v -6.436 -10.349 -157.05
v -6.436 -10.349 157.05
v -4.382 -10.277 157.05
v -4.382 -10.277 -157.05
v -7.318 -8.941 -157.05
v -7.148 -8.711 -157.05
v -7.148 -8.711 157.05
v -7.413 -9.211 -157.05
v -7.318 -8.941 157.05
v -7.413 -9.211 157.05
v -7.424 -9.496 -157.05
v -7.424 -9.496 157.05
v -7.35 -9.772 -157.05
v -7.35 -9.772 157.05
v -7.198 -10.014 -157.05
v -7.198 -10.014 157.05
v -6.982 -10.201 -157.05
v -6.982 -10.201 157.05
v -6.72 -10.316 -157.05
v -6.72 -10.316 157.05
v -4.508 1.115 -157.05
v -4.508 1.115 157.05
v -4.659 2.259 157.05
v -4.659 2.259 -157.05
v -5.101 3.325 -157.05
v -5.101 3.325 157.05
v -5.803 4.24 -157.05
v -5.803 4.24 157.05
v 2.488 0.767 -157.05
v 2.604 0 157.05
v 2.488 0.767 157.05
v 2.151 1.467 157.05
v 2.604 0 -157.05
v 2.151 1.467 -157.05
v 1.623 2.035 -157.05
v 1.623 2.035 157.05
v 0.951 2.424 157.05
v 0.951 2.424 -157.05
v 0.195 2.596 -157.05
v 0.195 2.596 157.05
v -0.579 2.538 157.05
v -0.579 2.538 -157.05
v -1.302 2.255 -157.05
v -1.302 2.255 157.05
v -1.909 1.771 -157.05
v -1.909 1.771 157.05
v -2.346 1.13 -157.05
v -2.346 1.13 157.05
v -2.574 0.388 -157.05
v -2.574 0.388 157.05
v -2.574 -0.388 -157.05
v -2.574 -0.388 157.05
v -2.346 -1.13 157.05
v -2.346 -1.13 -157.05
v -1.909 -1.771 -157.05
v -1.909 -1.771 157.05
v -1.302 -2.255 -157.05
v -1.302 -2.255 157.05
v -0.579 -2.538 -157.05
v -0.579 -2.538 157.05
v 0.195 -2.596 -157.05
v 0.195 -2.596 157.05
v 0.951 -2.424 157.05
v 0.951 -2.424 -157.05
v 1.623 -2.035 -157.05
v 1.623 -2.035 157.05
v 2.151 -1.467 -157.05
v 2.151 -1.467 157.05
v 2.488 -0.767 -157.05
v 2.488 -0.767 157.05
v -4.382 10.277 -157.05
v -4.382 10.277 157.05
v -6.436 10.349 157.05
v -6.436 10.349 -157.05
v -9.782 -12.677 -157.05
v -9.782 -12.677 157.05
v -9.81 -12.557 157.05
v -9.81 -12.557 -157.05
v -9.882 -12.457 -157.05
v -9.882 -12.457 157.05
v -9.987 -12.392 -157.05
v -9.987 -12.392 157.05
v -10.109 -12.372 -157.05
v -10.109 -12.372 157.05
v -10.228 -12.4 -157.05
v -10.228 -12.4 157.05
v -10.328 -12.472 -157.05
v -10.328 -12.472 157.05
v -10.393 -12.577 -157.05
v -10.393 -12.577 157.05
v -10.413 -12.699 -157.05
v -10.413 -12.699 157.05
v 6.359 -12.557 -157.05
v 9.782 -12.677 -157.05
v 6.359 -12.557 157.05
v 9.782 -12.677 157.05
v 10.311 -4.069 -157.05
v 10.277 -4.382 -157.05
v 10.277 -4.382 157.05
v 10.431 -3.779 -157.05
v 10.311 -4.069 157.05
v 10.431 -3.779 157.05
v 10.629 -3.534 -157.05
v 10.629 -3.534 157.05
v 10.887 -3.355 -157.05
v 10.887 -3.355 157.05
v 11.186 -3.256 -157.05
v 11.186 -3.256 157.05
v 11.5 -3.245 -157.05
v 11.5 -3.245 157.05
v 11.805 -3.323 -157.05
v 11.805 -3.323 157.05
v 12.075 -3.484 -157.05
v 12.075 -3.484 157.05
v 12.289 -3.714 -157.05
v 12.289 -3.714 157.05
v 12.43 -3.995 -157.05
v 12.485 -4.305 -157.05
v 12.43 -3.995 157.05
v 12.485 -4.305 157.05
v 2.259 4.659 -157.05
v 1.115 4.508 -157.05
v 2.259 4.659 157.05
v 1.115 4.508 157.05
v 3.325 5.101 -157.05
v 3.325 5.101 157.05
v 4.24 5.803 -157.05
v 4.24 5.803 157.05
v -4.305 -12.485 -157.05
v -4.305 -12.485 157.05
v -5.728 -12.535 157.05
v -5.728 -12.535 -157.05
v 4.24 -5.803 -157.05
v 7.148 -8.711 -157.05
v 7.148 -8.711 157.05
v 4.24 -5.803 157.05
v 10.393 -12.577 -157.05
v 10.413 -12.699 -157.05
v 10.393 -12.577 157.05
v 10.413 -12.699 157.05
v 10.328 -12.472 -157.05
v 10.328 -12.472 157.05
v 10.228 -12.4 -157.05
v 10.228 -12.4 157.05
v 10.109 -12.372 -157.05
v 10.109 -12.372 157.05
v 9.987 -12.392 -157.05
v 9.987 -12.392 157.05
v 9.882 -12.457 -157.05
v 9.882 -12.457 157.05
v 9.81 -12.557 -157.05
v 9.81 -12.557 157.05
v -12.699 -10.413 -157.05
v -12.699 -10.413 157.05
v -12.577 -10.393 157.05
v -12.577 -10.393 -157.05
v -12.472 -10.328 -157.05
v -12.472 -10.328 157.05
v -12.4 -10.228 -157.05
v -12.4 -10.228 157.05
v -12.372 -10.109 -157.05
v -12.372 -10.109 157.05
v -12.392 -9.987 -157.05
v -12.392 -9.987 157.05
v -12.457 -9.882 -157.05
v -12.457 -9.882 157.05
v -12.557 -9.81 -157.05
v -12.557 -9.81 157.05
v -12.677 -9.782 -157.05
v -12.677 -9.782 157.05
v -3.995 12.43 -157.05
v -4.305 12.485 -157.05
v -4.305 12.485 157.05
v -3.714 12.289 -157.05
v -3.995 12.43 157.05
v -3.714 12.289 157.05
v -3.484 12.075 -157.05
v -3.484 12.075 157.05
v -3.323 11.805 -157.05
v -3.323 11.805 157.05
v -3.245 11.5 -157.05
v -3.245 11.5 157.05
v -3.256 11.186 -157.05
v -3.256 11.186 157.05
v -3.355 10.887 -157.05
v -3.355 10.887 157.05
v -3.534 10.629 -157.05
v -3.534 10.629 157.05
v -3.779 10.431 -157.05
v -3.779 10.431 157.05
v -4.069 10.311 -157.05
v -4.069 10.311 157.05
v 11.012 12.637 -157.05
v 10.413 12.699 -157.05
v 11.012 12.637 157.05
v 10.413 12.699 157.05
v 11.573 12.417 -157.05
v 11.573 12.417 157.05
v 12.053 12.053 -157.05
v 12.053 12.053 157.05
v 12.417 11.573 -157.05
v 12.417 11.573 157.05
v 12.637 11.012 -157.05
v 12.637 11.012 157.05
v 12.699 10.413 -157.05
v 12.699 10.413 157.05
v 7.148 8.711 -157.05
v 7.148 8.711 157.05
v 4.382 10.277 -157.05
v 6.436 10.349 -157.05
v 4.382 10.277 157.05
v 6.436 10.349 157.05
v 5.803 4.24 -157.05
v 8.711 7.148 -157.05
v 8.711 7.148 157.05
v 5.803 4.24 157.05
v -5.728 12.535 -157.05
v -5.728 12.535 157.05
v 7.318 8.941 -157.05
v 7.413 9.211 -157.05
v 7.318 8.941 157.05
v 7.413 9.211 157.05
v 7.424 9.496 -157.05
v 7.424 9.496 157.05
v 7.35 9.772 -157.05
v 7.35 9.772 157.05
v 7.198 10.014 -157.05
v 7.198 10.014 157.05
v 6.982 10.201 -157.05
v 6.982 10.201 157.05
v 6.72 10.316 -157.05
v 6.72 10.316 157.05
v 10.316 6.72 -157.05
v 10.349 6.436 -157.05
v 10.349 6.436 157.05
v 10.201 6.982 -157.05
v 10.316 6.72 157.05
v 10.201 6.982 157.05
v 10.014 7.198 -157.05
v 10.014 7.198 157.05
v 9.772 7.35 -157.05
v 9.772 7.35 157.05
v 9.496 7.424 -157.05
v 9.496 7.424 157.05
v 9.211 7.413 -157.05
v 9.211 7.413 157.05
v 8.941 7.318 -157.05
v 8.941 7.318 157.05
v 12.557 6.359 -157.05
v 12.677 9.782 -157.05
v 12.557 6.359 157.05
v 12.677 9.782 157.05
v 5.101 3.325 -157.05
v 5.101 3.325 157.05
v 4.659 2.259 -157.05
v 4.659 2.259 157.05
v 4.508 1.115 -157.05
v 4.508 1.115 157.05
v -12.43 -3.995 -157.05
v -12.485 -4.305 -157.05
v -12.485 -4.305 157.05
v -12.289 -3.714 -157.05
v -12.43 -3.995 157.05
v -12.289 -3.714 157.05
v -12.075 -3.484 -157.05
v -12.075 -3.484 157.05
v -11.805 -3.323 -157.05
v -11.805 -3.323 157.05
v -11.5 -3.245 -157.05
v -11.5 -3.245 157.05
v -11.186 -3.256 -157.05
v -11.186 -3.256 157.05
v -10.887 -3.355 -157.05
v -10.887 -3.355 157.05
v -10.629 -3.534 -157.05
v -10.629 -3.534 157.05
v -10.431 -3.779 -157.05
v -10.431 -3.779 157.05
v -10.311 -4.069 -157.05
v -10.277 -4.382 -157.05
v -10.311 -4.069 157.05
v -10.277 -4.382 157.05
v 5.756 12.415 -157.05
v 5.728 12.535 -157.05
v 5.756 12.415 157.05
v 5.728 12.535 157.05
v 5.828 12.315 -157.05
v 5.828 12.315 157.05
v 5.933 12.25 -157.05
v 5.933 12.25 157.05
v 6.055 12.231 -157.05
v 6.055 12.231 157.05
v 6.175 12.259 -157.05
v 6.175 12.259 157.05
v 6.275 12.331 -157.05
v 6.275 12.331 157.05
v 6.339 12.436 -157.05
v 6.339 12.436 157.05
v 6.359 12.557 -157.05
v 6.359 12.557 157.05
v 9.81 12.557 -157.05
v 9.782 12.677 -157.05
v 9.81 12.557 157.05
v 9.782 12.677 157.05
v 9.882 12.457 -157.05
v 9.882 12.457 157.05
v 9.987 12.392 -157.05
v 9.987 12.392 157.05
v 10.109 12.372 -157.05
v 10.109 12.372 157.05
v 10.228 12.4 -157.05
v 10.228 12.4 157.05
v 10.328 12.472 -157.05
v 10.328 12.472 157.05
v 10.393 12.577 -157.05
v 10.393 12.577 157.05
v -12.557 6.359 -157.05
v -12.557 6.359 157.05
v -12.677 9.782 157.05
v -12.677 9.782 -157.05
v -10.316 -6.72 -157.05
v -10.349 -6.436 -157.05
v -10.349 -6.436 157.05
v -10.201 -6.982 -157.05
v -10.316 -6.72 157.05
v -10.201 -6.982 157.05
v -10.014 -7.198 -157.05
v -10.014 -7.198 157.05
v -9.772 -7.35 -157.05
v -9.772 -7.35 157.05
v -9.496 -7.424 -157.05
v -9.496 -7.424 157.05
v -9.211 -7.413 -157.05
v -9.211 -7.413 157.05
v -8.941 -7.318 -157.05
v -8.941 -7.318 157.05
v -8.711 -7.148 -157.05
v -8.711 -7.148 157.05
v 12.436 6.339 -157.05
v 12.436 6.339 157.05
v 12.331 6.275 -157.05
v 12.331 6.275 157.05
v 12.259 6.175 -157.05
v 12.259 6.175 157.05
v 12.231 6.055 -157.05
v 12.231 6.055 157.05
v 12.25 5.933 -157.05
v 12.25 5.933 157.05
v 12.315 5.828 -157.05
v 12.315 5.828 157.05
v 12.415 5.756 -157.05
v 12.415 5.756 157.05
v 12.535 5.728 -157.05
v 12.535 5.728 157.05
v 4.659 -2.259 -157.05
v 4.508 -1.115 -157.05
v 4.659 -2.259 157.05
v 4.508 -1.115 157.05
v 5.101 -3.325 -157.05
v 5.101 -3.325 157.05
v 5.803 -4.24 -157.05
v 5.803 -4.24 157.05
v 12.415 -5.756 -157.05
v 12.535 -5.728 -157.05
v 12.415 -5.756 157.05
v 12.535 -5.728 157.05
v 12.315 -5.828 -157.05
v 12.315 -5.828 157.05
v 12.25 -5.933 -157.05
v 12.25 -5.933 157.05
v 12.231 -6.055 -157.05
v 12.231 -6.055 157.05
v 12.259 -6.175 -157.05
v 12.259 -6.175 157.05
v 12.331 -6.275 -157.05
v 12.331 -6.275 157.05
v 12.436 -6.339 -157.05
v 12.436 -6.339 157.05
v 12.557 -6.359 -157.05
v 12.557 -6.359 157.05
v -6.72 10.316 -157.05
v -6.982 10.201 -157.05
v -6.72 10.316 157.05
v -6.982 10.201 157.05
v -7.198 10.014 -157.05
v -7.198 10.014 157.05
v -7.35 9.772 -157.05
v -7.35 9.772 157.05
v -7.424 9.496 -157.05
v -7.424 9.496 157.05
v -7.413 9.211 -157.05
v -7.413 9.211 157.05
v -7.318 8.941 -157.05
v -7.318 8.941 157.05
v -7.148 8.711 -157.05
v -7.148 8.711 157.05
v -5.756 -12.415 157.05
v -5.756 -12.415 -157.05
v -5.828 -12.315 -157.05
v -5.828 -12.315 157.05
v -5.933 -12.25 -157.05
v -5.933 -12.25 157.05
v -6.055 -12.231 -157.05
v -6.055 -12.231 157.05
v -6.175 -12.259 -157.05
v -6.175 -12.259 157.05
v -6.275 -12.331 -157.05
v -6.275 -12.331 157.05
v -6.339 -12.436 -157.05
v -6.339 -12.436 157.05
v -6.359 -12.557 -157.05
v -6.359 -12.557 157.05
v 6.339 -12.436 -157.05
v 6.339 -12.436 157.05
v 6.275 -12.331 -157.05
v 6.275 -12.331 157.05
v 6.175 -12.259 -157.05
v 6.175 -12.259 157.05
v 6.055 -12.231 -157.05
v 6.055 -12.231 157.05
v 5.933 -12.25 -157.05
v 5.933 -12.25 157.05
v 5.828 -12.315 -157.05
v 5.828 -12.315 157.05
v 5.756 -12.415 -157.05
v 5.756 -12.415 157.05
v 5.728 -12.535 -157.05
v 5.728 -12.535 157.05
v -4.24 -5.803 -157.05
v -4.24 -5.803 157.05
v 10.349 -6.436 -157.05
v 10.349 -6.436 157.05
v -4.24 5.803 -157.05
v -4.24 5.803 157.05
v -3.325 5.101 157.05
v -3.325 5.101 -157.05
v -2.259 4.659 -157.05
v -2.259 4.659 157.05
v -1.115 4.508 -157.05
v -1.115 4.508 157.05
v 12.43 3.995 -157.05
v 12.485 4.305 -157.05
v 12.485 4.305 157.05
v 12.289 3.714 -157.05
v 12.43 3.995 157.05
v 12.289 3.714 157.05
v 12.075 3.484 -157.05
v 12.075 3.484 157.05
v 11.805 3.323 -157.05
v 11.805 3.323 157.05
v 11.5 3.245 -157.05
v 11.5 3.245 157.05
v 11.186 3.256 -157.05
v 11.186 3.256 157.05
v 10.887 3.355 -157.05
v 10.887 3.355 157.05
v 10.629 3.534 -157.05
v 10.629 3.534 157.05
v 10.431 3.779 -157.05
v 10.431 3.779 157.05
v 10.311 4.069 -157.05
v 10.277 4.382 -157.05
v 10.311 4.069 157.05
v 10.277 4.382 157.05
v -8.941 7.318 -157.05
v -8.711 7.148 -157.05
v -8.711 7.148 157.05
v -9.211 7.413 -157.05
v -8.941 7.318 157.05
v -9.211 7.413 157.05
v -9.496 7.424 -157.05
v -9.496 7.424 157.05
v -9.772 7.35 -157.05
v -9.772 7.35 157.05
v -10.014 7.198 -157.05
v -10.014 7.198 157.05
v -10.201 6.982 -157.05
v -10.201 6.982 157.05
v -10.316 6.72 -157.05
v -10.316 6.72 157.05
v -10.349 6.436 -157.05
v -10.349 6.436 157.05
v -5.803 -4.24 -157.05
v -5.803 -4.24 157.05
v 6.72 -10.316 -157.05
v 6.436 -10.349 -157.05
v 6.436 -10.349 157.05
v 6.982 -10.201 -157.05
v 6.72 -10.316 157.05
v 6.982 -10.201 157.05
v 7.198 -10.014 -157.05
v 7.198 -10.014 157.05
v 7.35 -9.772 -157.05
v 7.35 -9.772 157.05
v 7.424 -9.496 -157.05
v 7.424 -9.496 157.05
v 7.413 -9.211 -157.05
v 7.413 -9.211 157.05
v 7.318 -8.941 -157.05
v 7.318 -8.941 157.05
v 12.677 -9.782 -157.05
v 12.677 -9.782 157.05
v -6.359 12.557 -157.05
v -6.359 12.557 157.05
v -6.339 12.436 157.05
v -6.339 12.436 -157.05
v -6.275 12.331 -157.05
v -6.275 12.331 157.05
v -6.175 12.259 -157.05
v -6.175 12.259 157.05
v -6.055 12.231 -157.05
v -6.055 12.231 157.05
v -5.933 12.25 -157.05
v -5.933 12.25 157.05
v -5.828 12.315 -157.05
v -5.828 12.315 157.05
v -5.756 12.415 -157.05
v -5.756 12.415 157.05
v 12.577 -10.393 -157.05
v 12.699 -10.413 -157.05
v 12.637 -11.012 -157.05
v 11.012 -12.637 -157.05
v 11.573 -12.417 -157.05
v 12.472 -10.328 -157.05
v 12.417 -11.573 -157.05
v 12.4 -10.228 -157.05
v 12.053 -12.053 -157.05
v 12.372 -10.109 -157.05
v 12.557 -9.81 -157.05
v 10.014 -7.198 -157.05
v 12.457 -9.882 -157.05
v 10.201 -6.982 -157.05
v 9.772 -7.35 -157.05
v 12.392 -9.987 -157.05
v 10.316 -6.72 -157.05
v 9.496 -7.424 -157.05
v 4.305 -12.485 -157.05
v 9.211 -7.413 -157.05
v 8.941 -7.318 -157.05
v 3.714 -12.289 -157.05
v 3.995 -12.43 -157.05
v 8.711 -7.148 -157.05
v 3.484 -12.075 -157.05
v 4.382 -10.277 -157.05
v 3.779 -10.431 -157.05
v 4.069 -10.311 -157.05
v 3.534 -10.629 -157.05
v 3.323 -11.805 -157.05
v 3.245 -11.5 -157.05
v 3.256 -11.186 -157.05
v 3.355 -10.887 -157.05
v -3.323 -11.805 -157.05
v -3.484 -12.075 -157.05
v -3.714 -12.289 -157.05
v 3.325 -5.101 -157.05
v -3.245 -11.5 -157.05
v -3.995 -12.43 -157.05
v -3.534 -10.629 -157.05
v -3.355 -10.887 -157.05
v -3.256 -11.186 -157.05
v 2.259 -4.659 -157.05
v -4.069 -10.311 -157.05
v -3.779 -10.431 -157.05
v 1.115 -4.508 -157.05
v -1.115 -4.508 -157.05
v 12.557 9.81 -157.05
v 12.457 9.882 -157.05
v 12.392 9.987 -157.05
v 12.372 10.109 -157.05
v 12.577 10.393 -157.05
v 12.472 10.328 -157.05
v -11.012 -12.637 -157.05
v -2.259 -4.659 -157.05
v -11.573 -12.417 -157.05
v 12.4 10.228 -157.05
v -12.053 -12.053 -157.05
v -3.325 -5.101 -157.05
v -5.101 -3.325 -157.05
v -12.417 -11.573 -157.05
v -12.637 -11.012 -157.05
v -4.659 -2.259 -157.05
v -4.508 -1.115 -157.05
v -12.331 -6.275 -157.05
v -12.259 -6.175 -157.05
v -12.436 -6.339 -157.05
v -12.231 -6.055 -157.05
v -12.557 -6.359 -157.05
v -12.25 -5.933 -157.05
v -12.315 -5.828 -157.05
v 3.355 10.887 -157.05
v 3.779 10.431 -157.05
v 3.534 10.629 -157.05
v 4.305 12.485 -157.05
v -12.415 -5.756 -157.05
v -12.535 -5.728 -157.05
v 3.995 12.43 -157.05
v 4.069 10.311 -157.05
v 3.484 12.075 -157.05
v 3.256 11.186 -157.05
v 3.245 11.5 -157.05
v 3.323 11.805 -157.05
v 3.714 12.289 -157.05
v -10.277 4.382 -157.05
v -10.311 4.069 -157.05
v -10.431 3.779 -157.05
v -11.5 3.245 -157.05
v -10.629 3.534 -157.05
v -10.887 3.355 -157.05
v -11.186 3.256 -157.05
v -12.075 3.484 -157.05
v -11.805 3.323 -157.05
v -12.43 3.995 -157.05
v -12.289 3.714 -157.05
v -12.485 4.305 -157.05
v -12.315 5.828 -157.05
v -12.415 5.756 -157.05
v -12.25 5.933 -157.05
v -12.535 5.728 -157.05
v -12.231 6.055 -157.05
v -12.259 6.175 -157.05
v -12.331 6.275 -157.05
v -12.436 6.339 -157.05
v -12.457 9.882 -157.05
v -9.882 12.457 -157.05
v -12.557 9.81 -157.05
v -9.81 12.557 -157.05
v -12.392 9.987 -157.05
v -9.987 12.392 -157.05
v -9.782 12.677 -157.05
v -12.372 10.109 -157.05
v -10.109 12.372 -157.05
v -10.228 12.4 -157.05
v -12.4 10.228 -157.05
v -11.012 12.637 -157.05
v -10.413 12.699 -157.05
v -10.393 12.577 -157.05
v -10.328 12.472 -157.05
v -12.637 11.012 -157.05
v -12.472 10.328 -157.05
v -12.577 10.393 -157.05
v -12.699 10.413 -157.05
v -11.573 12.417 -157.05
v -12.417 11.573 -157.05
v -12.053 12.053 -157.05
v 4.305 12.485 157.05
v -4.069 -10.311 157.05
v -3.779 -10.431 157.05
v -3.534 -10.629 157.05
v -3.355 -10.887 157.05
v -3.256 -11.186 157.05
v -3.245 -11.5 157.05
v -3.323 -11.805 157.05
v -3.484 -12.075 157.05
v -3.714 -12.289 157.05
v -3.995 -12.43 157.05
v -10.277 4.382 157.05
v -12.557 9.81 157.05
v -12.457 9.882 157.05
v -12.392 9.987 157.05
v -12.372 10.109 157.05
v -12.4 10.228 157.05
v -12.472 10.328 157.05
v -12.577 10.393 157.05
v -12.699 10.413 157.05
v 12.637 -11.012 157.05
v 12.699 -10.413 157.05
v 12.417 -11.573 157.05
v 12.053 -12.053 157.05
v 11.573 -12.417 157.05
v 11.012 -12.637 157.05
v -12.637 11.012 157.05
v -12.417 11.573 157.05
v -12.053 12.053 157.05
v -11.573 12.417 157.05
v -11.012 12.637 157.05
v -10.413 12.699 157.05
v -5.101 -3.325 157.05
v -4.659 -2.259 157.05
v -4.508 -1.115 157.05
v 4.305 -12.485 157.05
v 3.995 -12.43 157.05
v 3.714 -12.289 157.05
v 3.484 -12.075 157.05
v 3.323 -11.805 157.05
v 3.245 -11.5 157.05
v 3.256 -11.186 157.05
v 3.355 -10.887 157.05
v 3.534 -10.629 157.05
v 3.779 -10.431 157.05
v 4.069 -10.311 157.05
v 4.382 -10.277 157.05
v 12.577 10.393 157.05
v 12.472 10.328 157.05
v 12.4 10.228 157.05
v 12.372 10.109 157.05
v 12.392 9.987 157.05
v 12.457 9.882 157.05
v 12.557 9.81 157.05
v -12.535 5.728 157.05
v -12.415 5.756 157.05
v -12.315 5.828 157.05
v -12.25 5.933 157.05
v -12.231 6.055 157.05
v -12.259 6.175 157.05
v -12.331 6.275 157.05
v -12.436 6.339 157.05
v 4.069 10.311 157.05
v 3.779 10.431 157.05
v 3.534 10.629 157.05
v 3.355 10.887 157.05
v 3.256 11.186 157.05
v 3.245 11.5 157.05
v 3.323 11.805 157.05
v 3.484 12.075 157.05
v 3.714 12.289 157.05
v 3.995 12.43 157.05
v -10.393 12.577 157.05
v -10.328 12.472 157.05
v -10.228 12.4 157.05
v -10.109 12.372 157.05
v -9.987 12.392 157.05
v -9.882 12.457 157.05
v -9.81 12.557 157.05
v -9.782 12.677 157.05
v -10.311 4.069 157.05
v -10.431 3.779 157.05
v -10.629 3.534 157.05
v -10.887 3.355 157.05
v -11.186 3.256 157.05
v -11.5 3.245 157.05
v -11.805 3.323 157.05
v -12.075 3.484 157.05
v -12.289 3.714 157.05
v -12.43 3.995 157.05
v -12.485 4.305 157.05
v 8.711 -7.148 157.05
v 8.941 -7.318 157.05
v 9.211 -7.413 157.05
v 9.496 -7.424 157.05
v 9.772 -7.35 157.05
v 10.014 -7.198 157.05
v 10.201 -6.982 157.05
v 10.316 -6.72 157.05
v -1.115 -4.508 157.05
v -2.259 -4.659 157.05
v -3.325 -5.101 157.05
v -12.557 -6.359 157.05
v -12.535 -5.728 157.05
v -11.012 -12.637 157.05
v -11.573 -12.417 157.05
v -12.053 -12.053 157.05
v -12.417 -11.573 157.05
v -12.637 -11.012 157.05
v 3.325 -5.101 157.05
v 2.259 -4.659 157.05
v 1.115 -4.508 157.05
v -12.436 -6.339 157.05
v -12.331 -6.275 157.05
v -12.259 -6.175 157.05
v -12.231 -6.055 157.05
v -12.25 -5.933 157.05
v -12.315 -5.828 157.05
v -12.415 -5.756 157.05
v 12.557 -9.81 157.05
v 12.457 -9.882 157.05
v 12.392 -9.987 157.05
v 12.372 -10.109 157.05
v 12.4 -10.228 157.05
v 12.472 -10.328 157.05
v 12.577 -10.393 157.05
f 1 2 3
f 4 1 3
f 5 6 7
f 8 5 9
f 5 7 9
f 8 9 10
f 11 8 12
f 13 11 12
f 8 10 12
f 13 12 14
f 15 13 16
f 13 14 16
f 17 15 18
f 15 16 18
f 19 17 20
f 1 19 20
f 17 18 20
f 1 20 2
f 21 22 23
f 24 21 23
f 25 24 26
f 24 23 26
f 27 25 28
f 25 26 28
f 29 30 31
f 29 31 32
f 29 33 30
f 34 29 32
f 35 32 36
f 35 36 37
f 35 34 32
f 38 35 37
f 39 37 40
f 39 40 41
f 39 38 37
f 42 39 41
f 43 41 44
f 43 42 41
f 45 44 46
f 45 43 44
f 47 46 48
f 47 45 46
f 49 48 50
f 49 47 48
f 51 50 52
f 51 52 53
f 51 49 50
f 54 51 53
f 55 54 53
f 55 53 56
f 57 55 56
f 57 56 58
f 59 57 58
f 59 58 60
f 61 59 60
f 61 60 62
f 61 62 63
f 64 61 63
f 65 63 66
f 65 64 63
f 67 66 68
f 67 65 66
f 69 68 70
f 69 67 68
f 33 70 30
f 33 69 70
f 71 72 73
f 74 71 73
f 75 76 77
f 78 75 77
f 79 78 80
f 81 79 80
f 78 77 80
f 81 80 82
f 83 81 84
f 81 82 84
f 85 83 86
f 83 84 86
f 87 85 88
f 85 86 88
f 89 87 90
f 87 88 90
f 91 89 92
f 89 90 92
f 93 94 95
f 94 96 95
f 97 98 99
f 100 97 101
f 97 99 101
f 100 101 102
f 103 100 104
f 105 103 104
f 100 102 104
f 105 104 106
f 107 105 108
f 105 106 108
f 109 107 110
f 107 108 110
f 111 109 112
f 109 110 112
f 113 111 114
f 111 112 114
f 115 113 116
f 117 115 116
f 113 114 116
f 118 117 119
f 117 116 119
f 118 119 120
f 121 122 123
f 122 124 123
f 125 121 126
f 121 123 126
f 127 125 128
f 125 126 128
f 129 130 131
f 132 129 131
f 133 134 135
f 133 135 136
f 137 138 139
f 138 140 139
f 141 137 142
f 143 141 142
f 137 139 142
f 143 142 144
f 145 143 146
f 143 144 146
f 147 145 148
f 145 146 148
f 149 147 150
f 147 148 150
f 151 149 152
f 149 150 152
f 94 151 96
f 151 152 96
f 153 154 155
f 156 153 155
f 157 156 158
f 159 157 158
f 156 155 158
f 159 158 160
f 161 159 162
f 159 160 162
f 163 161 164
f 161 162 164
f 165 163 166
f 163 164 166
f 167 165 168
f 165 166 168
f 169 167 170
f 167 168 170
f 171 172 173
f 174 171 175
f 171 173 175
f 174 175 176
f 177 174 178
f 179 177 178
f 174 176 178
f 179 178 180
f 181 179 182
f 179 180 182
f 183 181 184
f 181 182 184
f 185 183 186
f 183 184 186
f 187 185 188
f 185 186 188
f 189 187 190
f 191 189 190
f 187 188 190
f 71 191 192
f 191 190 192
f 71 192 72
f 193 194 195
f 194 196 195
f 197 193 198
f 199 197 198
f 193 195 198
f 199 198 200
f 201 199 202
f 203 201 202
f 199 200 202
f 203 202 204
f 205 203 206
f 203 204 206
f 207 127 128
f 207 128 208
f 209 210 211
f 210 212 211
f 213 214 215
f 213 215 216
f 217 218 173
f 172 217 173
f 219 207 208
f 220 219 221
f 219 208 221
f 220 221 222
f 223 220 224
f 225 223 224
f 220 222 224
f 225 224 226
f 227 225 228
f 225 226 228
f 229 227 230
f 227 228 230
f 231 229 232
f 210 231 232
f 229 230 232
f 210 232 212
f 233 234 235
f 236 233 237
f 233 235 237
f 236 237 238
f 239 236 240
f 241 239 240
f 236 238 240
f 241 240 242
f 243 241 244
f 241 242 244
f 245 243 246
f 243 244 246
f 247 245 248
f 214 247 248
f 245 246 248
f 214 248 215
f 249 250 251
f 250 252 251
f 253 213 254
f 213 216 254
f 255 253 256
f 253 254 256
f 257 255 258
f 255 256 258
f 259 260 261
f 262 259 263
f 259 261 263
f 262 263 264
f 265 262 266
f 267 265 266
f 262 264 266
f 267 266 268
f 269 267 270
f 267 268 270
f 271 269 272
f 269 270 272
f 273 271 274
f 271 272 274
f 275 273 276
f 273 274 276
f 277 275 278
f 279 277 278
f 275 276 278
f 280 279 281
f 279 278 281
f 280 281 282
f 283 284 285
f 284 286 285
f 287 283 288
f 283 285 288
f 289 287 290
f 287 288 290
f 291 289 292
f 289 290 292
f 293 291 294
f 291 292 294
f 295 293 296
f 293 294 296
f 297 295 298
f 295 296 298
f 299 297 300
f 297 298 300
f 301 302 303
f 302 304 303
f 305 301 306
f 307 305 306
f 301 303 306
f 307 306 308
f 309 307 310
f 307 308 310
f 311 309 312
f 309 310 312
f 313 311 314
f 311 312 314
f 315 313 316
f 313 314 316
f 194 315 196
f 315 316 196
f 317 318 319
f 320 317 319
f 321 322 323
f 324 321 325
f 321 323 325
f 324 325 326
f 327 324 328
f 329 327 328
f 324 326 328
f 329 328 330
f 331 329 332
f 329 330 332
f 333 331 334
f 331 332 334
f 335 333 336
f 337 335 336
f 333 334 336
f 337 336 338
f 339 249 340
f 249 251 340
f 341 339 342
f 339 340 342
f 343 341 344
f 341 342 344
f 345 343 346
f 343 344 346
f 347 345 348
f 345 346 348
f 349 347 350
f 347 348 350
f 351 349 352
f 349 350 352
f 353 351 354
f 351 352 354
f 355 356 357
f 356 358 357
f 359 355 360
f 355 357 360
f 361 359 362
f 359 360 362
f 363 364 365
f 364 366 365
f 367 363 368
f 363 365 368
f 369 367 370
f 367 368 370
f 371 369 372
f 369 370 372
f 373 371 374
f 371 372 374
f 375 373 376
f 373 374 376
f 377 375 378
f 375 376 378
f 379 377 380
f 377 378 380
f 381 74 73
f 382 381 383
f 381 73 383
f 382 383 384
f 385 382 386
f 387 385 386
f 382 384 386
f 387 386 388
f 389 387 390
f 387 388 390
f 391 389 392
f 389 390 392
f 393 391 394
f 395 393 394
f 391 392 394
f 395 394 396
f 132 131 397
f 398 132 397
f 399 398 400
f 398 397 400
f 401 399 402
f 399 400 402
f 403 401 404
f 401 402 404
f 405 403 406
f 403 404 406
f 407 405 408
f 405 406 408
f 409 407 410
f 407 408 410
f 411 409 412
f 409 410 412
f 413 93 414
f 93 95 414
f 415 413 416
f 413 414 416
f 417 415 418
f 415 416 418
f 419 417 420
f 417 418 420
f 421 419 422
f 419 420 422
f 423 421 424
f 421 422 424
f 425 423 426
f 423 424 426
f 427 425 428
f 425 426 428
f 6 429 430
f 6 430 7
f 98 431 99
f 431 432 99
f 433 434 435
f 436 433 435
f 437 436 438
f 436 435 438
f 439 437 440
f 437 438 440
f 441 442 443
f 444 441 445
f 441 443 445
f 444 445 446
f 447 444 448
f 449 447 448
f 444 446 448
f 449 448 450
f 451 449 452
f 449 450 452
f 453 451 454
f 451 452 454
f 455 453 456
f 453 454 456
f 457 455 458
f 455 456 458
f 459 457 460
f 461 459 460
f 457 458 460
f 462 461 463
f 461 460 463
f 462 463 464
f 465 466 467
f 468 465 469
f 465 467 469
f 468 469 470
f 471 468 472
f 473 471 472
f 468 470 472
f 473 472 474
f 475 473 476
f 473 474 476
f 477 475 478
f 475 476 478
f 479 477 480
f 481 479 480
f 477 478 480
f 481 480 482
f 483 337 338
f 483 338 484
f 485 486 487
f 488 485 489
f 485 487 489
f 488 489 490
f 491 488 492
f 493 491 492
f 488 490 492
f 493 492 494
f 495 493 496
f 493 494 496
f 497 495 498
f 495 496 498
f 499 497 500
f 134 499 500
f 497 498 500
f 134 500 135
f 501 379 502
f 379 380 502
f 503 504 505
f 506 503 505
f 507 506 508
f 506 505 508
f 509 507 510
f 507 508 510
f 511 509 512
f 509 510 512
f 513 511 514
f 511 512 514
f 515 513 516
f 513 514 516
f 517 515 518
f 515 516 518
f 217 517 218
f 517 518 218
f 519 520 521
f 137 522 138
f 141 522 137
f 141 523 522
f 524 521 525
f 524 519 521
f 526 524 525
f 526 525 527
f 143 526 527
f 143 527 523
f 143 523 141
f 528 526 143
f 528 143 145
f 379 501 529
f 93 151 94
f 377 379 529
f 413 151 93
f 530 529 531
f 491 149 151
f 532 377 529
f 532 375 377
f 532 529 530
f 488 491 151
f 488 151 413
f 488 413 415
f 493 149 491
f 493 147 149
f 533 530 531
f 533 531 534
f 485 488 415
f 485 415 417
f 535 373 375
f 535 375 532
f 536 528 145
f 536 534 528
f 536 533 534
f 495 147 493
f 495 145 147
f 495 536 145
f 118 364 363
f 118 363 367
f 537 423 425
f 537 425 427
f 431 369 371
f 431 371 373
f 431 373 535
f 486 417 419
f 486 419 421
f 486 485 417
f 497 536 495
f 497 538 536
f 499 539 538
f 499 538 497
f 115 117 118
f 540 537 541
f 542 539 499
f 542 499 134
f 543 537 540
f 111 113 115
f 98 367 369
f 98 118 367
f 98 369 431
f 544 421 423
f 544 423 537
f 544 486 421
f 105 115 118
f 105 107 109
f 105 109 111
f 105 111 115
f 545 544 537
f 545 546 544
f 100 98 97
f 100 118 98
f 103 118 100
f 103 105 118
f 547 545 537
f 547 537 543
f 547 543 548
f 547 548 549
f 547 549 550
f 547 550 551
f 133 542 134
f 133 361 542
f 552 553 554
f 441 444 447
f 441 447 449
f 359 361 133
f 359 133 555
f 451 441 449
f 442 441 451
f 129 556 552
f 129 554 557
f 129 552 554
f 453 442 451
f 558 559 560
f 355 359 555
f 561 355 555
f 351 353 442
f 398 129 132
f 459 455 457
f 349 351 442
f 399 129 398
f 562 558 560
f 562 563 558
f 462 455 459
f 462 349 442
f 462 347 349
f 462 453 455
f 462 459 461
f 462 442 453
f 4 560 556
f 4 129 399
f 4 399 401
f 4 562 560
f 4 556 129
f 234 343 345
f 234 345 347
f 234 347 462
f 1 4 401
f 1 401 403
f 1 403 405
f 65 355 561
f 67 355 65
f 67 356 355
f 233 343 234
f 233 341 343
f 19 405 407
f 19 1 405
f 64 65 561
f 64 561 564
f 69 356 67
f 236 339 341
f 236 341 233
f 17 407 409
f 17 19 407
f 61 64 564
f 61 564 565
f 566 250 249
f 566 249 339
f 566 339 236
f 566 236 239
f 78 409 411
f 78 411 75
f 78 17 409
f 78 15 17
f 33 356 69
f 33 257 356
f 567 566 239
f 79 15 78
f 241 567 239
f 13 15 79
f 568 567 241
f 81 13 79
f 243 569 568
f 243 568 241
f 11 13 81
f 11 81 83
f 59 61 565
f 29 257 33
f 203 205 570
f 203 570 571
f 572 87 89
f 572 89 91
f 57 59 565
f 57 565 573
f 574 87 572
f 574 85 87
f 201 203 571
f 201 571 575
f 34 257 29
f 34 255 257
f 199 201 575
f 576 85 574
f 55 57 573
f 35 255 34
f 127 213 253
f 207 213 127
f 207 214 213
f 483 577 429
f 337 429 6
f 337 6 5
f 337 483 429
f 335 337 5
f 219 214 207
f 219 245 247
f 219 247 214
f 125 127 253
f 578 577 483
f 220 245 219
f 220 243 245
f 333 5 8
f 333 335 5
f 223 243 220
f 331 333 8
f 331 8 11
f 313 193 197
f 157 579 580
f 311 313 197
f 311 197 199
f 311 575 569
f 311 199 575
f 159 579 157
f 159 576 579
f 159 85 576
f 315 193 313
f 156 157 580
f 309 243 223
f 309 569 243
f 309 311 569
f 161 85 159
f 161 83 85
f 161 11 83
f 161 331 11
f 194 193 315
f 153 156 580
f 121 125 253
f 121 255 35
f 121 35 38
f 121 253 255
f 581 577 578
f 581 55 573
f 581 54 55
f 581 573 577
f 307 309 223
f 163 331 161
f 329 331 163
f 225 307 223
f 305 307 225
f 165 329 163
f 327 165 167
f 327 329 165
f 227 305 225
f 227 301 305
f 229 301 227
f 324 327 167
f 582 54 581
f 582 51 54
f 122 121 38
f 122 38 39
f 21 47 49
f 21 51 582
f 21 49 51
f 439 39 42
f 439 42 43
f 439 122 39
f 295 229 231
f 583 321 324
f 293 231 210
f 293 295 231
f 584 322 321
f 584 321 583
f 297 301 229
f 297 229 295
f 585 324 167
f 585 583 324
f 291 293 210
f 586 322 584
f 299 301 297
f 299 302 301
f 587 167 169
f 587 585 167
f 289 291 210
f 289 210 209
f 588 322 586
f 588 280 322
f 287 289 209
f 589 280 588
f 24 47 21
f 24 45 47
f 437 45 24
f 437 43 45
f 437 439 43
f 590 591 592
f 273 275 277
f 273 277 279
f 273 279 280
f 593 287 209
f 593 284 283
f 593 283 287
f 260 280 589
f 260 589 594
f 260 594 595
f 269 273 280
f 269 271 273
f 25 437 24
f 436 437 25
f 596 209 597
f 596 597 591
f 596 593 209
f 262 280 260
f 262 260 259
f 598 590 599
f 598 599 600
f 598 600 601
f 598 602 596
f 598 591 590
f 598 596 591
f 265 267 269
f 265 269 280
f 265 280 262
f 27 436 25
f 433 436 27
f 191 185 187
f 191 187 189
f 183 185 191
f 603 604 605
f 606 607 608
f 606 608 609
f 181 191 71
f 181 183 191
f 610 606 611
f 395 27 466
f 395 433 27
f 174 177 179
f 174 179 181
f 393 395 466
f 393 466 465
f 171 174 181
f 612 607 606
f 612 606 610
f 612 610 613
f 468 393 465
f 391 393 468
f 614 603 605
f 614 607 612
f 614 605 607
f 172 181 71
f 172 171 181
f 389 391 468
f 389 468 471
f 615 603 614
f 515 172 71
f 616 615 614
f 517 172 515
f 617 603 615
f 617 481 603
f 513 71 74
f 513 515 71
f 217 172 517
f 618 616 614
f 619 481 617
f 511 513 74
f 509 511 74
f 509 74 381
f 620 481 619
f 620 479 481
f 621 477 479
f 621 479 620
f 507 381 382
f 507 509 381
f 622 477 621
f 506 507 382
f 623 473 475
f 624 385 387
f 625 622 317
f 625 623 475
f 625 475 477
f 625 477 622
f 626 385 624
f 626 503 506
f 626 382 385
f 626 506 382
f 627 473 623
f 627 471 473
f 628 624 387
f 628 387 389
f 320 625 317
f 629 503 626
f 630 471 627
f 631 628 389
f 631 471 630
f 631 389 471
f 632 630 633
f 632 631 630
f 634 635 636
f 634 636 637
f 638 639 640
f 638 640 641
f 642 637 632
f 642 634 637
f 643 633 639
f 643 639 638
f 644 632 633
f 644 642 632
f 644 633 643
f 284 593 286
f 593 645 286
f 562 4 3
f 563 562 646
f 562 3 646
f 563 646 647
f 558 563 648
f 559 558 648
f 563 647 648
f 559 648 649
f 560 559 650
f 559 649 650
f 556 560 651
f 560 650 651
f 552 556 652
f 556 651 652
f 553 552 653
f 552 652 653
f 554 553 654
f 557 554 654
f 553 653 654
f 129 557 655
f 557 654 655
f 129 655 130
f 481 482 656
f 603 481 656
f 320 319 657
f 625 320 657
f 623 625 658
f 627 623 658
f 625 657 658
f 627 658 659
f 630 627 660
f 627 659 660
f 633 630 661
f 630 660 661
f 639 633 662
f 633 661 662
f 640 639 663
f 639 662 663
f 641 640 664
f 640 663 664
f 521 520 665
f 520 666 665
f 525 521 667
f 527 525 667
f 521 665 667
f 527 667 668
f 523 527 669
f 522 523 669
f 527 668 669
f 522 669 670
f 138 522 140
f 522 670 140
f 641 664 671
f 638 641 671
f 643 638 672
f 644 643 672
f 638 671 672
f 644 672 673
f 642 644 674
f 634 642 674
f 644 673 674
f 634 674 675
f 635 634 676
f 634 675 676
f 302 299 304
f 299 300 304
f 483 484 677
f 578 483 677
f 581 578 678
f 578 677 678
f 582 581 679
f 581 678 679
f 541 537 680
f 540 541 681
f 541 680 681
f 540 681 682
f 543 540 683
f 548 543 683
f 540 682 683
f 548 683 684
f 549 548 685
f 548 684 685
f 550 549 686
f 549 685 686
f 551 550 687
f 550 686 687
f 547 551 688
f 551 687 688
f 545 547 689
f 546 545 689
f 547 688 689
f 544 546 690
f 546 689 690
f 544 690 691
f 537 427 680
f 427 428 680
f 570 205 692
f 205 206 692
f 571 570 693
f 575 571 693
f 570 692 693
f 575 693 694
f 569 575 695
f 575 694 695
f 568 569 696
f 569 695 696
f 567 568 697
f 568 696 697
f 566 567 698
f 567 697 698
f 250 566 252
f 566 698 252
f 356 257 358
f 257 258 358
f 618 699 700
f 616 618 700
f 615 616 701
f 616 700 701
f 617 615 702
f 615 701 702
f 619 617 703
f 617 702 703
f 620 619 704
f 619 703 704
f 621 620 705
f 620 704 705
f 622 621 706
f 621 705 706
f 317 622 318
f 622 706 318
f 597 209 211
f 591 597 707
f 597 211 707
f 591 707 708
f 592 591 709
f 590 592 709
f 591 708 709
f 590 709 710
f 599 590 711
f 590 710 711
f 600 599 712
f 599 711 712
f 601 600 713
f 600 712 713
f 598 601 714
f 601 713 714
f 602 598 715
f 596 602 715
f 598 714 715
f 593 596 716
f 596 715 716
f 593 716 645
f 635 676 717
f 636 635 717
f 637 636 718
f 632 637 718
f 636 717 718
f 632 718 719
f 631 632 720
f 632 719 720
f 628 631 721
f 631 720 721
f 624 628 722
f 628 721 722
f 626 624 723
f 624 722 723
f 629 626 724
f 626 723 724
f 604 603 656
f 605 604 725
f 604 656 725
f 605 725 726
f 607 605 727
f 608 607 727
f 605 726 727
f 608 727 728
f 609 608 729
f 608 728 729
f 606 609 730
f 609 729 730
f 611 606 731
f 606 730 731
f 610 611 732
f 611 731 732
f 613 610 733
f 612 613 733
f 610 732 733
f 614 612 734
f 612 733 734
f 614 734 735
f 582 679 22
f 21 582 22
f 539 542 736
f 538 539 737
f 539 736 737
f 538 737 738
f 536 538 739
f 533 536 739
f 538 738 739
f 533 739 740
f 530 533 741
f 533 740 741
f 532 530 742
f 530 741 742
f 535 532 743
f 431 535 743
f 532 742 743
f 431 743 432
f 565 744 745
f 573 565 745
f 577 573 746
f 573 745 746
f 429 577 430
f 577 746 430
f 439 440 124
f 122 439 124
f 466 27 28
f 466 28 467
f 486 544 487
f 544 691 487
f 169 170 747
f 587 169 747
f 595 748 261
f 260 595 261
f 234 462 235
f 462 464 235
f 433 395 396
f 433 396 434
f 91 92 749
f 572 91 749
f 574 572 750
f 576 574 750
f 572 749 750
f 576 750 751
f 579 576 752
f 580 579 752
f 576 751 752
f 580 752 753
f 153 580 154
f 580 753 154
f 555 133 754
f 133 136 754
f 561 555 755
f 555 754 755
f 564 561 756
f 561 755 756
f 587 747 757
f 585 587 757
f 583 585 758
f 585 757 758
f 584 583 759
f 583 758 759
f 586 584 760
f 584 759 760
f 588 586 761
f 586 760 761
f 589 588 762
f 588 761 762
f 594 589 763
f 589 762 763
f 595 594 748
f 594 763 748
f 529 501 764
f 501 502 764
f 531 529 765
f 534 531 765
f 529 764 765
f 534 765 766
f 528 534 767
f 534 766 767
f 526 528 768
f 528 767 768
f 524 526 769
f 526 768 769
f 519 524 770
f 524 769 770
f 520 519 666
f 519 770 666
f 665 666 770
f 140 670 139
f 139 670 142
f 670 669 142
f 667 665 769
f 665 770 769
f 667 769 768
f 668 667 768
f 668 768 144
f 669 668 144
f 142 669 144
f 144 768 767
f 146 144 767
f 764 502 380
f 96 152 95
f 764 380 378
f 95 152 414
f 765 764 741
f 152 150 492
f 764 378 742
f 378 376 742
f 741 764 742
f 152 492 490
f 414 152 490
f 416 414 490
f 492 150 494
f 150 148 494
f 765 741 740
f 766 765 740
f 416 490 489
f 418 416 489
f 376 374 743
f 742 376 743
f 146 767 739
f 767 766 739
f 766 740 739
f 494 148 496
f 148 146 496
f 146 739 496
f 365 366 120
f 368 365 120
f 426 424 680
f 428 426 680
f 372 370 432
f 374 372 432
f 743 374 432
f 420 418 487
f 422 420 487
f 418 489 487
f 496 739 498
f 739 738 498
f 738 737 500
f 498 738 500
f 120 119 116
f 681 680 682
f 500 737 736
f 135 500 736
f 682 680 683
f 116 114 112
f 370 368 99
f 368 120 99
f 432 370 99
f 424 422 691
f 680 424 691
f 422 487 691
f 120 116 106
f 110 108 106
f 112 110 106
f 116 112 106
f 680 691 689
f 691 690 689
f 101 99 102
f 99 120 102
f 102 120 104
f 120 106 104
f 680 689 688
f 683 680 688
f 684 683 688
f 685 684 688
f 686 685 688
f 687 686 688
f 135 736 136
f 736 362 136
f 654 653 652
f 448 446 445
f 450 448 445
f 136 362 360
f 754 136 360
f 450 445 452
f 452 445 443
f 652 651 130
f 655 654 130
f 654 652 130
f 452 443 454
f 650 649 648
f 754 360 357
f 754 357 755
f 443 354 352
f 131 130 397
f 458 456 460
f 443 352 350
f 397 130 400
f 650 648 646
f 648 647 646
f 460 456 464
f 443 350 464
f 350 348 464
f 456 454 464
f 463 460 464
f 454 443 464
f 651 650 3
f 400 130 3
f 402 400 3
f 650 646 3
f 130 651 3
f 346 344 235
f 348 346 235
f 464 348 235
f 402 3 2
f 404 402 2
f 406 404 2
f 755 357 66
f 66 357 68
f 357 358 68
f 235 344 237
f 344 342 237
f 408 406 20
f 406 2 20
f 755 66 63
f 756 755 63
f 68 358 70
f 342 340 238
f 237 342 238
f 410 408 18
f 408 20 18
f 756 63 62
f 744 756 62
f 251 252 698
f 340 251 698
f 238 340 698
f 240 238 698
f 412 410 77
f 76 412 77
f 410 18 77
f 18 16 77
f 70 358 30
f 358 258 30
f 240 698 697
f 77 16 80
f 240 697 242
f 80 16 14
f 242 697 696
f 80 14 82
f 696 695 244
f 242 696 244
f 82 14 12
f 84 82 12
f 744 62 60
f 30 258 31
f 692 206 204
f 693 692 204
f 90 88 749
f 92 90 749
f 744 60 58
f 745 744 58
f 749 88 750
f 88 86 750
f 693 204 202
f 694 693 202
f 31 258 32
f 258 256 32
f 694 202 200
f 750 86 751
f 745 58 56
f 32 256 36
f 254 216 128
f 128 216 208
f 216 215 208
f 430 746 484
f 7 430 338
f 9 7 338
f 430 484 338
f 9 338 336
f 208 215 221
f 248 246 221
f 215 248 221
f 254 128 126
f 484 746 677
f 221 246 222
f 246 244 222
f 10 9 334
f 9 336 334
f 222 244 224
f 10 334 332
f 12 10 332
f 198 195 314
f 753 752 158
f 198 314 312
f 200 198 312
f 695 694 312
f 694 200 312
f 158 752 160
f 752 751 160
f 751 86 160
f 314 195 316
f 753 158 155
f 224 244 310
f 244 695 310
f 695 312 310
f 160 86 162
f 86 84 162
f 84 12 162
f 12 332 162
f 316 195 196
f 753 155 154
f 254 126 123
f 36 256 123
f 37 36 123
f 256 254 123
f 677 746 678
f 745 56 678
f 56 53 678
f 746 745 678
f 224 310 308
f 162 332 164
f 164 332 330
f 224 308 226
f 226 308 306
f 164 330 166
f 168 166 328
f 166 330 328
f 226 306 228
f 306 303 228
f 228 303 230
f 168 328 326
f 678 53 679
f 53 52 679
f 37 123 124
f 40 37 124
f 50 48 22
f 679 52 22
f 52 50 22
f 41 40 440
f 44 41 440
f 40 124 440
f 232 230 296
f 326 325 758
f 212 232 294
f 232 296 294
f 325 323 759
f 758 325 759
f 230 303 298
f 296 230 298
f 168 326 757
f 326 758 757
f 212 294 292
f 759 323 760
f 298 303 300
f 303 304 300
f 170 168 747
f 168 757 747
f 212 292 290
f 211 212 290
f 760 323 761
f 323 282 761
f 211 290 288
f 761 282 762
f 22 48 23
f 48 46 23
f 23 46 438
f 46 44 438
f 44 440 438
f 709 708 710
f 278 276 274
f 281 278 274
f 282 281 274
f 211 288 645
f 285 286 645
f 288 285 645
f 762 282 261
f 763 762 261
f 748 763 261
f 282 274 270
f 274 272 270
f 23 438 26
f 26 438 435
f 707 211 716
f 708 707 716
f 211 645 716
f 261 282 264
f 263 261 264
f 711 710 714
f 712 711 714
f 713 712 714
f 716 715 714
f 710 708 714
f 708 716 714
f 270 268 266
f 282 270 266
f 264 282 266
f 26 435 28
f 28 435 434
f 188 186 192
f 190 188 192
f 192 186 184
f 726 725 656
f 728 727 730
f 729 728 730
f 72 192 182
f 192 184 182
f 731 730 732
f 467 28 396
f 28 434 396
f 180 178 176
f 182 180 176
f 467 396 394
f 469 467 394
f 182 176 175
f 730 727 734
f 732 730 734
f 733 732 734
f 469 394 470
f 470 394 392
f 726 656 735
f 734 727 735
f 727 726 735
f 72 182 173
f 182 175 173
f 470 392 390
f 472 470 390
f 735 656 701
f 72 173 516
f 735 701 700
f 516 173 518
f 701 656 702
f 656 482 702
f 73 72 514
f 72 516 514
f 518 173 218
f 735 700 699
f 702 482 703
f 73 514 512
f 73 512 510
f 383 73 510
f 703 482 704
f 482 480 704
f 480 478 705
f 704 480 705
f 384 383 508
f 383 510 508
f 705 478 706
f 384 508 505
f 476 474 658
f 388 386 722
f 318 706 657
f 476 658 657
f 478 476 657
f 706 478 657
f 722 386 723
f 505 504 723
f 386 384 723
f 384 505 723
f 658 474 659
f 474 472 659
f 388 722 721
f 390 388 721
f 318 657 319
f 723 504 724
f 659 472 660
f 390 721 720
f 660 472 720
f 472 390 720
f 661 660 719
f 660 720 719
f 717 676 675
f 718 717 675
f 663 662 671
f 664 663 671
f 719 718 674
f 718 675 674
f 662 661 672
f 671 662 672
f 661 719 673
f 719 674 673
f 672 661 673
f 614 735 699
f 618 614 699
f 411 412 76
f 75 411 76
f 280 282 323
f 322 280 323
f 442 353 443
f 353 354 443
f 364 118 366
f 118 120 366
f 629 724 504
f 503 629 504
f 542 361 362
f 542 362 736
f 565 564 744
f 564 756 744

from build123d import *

# Parameters (mm, degrees)
SKETCH3_R      = 2.6035
EXTRUDE1_DEPTH = 157.05


with BuildPart() as part:
    # Sketch3 → Extrude1 (new, symmetric)
    with BuildSketch(Plane.XY):
        with BuildLine():
            Line((-1.115277175, 4.5085), (1.115277175, 4.5085))
            ThreePointArc((1.115277175, 4.5085), (2.806584872, 4.844922018), (4.240406305, 5.80297087))
            Line((4.240406305, 5.80297087), (7.148423664, 8.710988229))
            ThreePointArc((7.148423664, 8.710988229), (7.349906316, 9.772227925), (6.436353897, 10.348636575))
            Line((6.436353897, 10.348636575), (4.381960454, 10.276895575))
            ThreePointArc((4.381960454, 10.276895575), (3.239173075, 11.342562046), (4.304839546, 12.485349424))
            Line((4.304839546, 12.485349424), (5.728246175, 12.535055879))
            ThreePointArc((5.728246175, 12.535055879), (6.054756855, 12.230579745), (6.35923299, 12.557090424))
            Line((6.35923299, 12.557090424), (9.782092278, 12.676619304))
            ThreePointArc((9.782092278, 12.676619304), (10.108602958, 12.37214317), (10.413079092, 12.69865385))
            ThreePointArc((10.413079092, 12.69865385), (12.052764565, 12.052764565), (12.69865385, 10.413079092))
            ThreePointArc((12.69865385, 10.413079092), (12.37214317, 10.108602958), (12.676619304, 9.782092278))
            Line((12.676619304, 9.782092278), (12.557090424, 6.35923299))
            ThreePointArc((12.557090424, 6.35923299), (12.230579745, 6.054756855), (12.535055879, 5.728246175))
            Line((12.535055879, 5.728246175), (12.485349424, 4.304839546))
            ThreePointArc((12.485349424, 4.304839546), (11.342562046, 3.239173075), (10.276895575, 4.381960454))
            Line((10.276895575, 4.381960454), (10.348636575, 6.436353897))
            ThreePointArc((10.348636575, 6.436353897), (9.772227925, 7.349906316), (8.710988229, 7.148423664))
            Line((8.710988229, 7.148423664), (5.80297087, 4.240406305))
            ThreePointArc((5.80297087, 4.240406305), (4.844922018, 2.806584872), (4.5085, 1.115277175))
            Line((4.5085, 1.115277175), (4.5085, -1.115277175))
            ThreePointArc((4.5085, -1.115277175), (4.844922018, -2.806584872), (5.80297087, -4.240406305))
            Line((5.80297087, -4.240406305), (8.710988229, -7.148423664))
            ThreePointArc((8.710988229, -7.148423664), (9.772227925, -7.349906316), (10.348636575, -6.436353897))
            Line((10.348636575, -6.436353897), (10.276895575, -4.381960454))
            ThreePointArc((10.276895575, -4.381960454), (11.342562046, -3.239173075), (12.485349424, -4.304839546))
            Line((12.485349424, -4.304839546), (12.535055879, -5.728246175))
            ThreePointArc((12.535055879, -5.728246175), (12.230579745, -6.054756855), (12.557090424, -6.35923299))
            Line((12.557090424, -6.35923299), (12.676619304, -9.782092278))
            ThreePointArc((12.676619304, -9.782092278), (12.37214317, -10.108602958), (12.69865385, -10.413079092))
            ThreePointArc((12.69865385, -10.413079092), (12.052764565, -12.052764565), (10.413079092, -12.69865385))
            ThreePointArc((10.413079092, -12.69865385), (10.108602958, -12.37214317), (9.782092278, -12.676619304))
            Line((9.782092278, -12.676619304), (6.35923299, -12.557090424))
            ThreePointArc((6.35923299, -12.557090424), (6.054756855, -12.230579745), (5.728246175, -12.535055879))
            Line((5.728246175, -12.535055879), (4.304839546, -12.485349424))
            ThreePointArc((4.304839546, -12.485349424), (3.239173075, -11.342562046), (4.381960454, -10.276895575))
            Line((4.381960454, -10.276895575), (6.436353897, -10.348636575))
            ThreePointArc((6.436353897, -10.348636575), (7.349906316, -9.772227925), (7.148423664, -8.710988229))
            Line((7.148423664, -8.710988229), (4.240406305, -5.80297087))
            ThreePointArc((4.240406305, -5.80297087), (2.806584872, -4.844922018), (1.115277175, -4.5085))
            Line((1.115277175, -4.5085), (-1.115277175, -4.5085))
            ThreePointArc((-1.115277175, -4.5085), (-2.806584872, -4.844922018), (-4.240406305, -5.80297087))
            Line((-4.240406305, -5.80297087), (-7.148423664, -8.710988229))
            ThreePointArc((-7.148423664, -8.710988229), (-7.349906316, -9.772227925), (-6.436353897, -10.348636575))
            Line((-6.436353897, -10.348636575), (-4.381960454, -10.276895575))
            ThreePointArc((-4.381960454, -10.276895575), (-3.239173075, -11.342562046), (-4.304839546, -12.485349424))
            Line((-4.304839546, -12.485349424), (-5.728246175, -12.535055879))
            ThreePointArc((-5.728246175, -12.535055879), (-6.054756855, -12.230579745), (-6.35923299, -12.557090424))
            Line((-6.35923299, -12.557090424), (-9.782092278, -12.676619304))
            ThreePointArc((-9.782092278, -12.676619304), (-10.108602958, -12.37214317), (-10.413079092, -12.69865385))
            ThreePointArc((-10.413079092, -12.69865385), (-12.052764565, -12.052764565), (-12.69865385, -10.413079092))
            ThreePointArc((-12.69865385, -10.413079092), (-12.37214317, -10.108602958), (-12.676619304, -9.782092278))
            Line((-12.676619304, -9.782092278), (-12.557090424, -6.35923299))
            ThreePointArc((-12.557090424, -6.35923299), (-12.230579745, -6.054756855), (-12.535055879, -5.728246175))
            Line((-12.535055879, -5.728246175), (-12.485349424, -4.304839546))
            ThreePointArc((-12.485349424, -4.304839546), (-11.342562046, -3.239173075), (-10.276895575, -4.381960454))
            Line((-10.276895575, -4.381960454), (-10.348636575, -6.436353897))
            ThreePointArc((-10.348636575, -6.436353897), (-9.772227925, -7.349906316), (-8.710988229, -7.148423664))
            Line((-8.710988229, -7.148423664), (-5.80297087, -4.240406305))
            ThreePointArc((-5.80297087, -4.240406305), (-4.844922018, -2.806584872), (-4.5085, -1.115277175))
            Line((-4.5085, -1.115277175), (-4.5085, 1.115277175))
            ThreePointArc((-4.5085, 1.115277175), (-4.844922018, 2.806584872), (-5.80297087, 4.240406305))
            Line((-5.80297087, 4.240406305), (-8.710988229, 7.148423664))
            ThreePointArc((-8.710988229, 7.148423664), (-9.772227925, 7.349906316), (-10.348636575, 6.436353897))
            Line((-10.348636575, 6.436353897), (-10.276895575, 4.381960454))
            ThreePointArc((-10.276895575, 4.381960454), (-11.342562046, 3.239173075), (-12.485349424, 4.304839546))
            Line((-12.485349424, 4.304839546), (-12.535055879, 5.728246175))
            ThreePointArc((-12.535055879, 5.728246175), (-12.230579745, 6.054756855), (-12.557090424, 6.35923299))
            Line((-12.557090424, 6.35923299), (-12.676619304, 9.782092278))
            ThreePointArc((-12.676619304, 9.782092278), (-12.37214317, 10.108602958), (-12.69865385, 10.413079092))
            ThreePointArc((-12.69865385, 10.413079092), (-12.052764565, 12.052764565), (-10.413079092, 12.69865385))
            ThreePointArc((-10.413079092, 12.69865385), (-10.108602958, 12.37214317), (-9.782092278, 12.676619304))
            Line((-9.782092278, 12.676619304), (-6.35923299, 12.557090424))
            ThreePointArc((-6.35923299, 12.557090424), (-6.054756855, 12.230579745), (-5.728246175, 12.535055879))
            Line((-5.728246175, 12.535055879), (-4.304839546, 12.485349424))
            ThreePointArc((-4.304839546, 12.485349424), (-3.239173075, 11.342562046), (-4.381960454, 10.276895575))
            Line((-4.381960454, 10.276895575), (-6.436353897, 10.348636575))
            ThreePointArc((-6.436353897, 10.348636575), (-7.349906316, 9.772227925), (-7.148423664, 8.710988229))
            Line((-7.148423664, 8.710988229), (-4.240406305, 5.80297087))
            ThreePointArc((-4.240406305, 5.80297087), (-2.806584872, 4.844922018), (-1.115277175, 4.5085))
        make_face()
        Circle(SKETCH3_R, mode=Mode.SUBTRACT)
    extrude(amount=EXTRUDE1_DEPTH, both=True)


solid = part.part
